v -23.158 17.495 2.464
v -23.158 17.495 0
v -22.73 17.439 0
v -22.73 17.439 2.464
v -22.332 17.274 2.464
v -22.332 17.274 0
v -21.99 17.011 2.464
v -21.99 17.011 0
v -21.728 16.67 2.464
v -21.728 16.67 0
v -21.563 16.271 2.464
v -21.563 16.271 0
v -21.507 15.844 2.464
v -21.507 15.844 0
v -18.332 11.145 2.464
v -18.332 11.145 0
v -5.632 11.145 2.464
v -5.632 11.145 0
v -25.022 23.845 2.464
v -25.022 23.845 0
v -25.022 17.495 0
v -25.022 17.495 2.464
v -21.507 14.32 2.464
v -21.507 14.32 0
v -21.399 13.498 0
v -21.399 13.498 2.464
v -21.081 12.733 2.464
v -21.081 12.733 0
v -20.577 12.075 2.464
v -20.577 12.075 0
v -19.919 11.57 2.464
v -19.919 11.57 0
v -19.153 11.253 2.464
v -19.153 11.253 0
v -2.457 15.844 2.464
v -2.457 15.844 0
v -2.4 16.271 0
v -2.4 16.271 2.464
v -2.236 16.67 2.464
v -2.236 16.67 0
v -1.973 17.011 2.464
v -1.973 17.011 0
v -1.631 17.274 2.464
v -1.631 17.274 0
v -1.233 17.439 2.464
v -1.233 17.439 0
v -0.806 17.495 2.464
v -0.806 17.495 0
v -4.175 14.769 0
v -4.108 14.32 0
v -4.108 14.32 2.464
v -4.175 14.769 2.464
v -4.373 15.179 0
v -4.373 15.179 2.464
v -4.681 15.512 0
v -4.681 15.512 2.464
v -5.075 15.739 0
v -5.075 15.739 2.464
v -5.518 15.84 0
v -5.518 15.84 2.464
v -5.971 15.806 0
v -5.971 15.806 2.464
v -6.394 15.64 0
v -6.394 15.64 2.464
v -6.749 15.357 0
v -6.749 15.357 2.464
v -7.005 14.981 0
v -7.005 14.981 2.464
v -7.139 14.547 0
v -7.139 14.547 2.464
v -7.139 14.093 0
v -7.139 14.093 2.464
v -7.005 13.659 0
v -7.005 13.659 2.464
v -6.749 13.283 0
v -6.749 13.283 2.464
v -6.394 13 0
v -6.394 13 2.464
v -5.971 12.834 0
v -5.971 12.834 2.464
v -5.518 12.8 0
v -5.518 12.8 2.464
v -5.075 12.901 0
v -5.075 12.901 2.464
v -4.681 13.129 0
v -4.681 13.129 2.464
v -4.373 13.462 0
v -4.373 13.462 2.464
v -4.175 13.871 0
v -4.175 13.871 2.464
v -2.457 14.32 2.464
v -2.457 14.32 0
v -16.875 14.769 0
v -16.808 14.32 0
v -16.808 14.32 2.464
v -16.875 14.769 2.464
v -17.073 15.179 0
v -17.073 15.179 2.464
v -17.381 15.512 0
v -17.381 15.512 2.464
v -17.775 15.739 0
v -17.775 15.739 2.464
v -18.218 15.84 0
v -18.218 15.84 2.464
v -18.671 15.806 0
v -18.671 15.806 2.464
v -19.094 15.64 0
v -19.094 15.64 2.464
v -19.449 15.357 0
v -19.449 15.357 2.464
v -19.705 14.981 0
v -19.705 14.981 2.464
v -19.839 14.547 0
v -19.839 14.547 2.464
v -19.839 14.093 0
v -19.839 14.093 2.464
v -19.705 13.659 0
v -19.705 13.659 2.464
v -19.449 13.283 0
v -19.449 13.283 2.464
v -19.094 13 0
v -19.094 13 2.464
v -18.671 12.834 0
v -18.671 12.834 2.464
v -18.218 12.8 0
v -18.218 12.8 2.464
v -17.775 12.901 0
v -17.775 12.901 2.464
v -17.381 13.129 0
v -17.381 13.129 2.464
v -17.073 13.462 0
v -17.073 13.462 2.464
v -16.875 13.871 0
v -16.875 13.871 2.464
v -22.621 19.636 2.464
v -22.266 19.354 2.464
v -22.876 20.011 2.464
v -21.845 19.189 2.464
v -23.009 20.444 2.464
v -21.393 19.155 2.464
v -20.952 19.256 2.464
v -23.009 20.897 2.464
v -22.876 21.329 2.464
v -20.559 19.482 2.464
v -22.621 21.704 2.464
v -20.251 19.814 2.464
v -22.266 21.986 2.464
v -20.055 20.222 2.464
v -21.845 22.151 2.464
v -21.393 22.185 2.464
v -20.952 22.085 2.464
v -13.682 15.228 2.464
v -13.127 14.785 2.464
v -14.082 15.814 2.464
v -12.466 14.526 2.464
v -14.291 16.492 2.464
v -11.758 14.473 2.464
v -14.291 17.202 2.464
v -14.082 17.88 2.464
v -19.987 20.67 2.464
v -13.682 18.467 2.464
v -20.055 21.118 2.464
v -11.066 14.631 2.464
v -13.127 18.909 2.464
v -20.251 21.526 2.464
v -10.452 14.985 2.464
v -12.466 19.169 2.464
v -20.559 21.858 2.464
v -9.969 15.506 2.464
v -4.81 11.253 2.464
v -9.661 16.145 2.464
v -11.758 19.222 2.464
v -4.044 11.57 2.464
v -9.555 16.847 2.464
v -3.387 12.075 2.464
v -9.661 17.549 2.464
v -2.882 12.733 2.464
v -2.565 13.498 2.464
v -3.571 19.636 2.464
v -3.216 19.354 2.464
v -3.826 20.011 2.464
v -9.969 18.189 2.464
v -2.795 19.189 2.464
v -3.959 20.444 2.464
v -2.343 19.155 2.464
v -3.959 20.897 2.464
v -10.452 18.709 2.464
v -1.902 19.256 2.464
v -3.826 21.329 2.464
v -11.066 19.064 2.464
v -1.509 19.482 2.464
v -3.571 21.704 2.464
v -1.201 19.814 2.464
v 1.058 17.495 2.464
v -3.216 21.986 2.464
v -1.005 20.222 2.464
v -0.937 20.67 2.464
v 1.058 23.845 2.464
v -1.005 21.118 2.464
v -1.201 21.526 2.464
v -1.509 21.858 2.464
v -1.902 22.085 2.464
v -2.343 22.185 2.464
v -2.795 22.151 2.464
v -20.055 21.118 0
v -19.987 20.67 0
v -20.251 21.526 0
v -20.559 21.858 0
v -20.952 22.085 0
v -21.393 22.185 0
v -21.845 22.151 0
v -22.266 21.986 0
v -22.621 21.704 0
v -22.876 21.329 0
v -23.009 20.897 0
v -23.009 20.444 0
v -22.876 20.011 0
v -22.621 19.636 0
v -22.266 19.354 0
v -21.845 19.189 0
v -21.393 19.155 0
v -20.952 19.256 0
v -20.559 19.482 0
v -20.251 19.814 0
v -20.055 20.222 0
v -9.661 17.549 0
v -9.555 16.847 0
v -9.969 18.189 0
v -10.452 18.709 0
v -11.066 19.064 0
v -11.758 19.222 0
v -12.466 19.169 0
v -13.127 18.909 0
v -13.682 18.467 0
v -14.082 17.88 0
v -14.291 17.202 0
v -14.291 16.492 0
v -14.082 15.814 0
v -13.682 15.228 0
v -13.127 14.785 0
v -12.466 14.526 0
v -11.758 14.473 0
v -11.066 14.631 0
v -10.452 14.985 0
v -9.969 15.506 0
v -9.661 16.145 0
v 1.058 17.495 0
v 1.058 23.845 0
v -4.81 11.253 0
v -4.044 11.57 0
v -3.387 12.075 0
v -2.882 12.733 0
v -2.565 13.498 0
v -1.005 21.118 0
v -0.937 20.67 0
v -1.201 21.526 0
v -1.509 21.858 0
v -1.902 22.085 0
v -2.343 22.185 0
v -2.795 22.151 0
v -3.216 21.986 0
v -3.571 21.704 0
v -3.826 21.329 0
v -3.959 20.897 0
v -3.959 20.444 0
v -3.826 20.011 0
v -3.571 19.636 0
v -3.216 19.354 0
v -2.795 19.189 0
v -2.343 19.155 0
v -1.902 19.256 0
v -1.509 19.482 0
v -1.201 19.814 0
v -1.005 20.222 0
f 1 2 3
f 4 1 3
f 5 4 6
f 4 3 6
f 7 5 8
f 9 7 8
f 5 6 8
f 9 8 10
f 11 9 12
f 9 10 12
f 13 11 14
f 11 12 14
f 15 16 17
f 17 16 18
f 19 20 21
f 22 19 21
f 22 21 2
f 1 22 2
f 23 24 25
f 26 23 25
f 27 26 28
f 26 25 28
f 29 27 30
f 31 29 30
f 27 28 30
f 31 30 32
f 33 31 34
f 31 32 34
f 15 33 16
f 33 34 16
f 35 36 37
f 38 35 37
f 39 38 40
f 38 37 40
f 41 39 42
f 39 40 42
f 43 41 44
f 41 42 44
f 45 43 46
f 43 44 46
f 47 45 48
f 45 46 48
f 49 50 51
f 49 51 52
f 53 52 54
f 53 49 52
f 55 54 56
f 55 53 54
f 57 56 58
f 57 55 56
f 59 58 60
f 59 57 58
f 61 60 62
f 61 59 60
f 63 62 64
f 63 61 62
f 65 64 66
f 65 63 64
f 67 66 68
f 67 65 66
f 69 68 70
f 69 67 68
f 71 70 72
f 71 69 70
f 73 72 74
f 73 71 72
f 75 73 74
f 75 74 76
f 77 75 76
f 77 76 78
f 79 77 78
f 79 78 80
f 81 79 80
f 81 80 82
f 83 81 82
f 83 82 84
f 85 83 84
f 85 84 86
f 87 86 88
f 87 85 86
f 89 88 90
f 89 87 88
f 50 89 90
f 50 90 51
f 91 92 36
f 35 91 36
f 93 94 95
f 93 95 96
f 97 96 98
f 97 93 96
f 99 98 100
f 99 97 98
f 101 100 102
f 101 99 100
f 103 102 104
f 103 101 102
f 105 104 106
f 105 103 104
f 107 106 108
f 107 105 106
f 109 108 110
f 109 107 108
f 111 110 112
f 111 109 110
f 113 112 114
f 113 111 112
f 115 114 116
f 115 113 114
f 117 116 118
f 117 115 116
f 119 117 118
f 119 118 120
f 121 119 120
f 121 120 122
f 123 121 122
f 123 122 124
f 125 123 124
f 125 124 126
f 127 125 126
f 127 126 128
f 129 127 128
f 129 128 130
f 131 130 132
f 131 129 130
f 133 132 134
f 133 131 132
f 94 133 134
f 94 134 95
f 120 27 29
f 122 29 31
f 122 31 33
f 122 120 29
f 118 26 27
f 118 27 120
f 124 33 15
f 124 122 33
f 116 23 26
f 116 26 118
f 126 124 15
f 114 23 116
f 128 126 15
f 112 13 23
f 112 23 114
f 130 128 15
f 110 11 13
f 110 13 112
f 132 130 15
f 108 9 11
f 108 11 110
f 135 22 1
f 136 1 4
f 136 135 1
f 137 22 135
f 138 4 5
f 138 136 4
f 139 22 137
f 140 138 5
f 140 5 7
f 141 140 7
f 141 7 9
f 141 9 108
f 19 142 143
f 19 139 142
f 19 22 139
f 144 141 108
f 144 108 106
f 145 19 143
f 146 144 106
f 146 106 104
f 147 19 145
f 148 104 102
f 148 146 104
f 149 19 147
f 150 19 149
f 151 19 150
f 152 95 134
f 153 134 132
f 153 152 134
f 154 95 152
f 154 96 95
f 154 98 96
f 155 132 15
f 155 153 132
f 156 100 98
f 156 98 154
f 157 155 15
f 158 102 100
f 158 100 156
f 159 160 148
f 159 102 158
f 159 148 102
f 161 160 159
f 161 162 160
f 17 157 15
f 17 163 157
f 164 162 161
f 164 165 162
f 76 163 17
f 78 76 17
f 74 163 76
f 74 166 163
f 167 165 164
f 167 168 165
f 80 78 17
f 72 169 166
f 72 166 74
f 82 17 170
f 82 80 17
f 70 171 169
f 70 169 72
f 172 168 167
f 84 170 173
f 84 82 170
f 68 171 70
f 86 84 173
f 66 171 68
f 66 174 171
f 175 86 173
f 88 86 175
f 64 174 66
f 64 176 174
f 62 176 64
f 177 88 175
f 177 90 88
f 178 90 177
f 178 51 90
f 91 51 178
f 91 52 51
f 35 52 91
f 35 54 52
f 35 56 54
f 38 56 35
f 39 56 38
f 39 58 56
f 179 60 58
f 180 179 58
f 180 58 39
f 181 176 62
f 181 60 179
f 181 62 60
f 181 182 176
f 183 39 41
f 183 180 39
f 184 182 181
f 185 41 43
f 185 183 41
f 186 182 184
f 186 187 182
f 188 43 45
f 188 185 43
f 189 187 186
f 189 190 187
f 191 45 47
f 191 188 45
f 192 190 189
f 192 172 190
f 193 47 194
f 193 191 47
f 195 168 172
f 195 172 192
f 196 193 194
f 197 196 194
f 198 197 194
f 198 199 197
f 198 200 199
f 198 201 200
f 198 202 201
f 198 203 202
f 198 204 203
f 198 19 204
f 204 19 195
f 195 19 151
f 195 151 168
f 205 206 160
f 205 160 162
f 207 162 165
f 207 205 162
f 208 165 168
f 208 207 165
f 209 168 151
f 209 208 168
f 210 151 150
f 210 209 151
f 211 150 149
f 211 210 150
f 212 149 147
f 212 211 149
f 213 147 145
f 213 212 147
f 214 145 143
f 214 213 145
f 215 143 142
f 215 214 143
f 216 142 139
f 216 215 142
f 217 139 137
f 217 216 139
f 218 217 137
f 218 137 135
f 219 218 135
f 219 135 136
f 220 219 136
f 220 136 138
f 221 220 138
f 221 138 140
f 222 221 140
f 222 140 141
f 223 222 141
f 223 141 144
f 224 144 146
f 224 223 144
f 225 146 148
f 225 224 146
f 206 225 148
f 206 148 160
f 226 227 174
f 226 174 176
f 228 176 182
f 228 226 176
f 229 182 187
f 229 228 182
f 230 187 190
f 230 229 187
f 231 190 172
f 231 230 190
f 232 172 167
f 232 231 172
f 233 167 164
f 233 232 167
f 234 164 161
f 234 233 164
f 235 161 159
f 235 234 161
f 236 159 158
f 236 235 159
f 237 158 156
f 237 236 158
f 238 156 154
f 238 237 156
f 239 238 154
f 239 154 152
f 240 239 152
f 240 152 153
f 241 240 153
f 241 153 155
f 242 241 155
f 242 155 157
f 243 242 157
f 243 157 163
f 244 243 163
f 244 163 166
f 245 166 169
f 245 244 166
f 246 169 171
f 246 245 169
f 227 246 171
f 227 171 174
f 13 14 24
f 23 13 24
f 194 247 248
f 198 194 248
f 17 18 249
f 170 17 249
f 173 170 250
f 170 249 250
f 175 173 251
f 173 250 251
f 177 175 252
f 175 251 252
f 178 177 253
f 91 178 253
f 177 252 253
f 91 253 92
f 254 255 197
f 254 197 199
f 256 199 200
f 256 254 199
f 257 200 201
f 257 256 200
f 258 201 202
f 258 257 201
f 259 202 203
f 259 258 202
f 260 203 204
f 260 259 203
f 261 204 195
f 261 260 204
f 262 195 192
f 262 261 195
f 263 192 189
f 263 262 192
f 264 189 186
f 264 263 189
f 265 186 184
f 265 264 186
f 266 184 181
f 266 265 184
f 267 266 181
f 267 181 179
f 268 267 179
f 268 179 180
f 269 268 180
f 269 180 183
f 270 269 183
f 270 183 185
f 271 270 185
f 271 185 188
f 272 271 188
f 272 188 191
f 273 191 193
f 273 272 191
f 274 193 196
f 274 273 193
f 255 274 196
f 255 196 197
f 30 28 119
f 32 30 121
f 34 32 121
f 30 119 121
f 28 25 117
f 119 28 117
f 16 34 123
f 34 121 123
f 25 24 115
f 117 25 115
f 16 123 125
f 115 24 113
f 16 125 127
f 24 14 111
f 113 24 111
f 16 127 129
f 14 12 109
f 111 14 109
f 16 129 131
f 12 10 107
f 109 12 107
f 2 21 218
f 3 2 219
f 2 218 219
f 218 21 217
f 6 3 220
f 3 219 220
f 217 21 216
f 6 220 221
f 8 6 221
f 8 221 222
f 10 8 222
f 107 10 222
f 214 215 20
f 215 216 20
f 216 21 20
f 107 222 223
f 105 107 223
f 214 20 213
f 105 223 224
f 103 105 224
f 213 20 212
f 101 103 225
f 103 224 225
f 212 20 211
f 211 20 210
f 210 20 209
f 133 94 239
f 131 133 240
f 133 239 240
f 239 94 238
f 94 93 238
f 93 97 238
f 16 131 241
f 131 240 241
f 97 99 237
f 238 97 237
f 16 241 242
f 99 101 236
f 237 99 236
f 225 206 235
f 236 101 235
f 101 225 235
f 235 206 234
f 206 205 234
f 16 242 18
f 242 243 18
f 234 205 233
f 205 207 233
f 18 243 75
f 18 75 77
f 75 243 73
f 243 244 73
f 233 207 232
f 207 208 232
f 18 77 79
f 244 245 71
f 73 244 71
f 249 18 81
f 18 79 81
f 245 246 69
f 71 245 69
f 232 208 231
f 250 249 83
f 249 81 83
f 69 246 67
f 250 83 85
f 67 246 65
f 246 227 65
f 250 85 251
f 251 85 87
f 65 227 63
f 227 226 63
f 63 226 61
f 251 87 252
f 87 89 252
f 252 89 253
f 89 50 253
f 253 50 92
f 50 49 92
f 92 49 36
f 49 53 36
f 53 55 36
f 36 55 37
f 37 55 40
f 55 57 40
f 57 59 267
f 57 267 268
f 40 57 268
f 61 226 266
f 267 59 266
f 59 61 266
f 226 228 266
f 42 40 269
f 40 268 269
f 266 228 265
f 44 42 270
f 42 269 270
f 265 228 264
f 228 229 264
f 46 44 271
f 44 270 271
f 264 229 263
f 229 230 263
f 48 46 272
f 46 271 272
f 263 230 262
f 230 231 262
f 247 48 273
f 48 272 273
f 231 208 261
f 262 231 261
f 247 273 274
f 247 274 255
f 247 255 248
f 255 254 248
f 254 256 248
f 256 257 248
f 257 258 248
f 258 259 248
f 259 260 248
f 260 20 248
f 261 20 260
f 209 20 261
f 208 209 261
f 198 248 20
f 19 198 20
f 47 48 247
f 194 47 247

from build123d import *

# Parameters (mm, degrees)
F0_R     = 1.524
F0_R_2   = 2.38125
F0_R_3   = 1.519554
F1_DEPTH = 2.4638


with BuildPart() as f1:
    # F0 (on Top) → F1 (new body)
    with BuildSketch(Plane.XY):
        with BuildLine():
            ThreePointArc((-21.506696, 14.320038), (-20.57676, 12.074974), (-18.331696, 11.145038))
            Line((-18.331696, 11.145038), (-17.426178, 11.145038))
            Line((-17.426178, 11.145038), (-6.537213, 11.145038))
            Line((-6.537213, 11.145038), (-5.631696, 11.145038))
            ThreePointArc((-5.631696, 11.145038), (-3.386632, 12.074974), (-2.456696, 14.320038))
            Line((-2.456696, 14.320038), (-2.456696, 15.844038))
            ThreePointArc((-2.456696, 15.844038), (-1.973129, 17.011471), (-0.805696, 17.495038))
            Line((-0.805696, 17.495038), (-0.59268, 17.495038))
            Line((-0.59268, 17.495038), (1.05832, 17.495038))
            Line((1.05832, 17.495038), (1.05832, 19.146038))
            Line((1.05832, 19.146038), (1.05832, 22.194038))
            Line((1.05832, 22.194038), (1.05832, 23.845038))
            Line((1.05832, 23.845038), (-0.59268, 23.845038))
            Line((-0.59268, 23.845038), (-2.456696, 23.845038))
            Line((-2.456696, 23.845038), (-4.92218, 23.845038))
            Line((-4.92218, 23.845038), (-18.700644, 23.845038))
            Line((-18.700644, 23.845038), (-23.370711, 23.845038))
            Line((-23.370711, 23.845038), (-25.021711, 23.845038))
            Line((-25.021711, 23.845038), (-25.021711, 22.194038))
            Line((-25.021711, 22.194038), (-25.021711, 19.146038))
            Line((-25.021711, 19.146038), (-25.021711, 17.495038))
            Line((-25.021711, 17.495038), (-23.370711, 17.495038))
            Line((-23.370711, 17.495038), (-23.157696, 17.495038))
            ThreePointArc((-23.157696, 17.495038), (-21.990262, 17.011471), (-21.506696, 15.844038))
            Line((-21.506696, 15.844038), (-21.506696, 14.320038))
        make_face()
        with Locations((-18.331696, 14.320038)):
            Circle(F0_R, mode=Mode.SUBTRACT)
        with Locations((-5.631696, 14.320038)):
            Circle(F0_R, mode=Mode.SUBTRACT)
        with Locations((-11.936313, 16.847185)):
            Circle(F0_R_2, mode=Mode.SUBTRACT)
        with Locations((-21.506696, 20.670038)):
            Circle(F0_R_3, mode=Mode.SUBTRACT)
        with Locations((-2.456696, 20.670038)):
            Circle(F0_R_3, mode=Mode.SUBTRACT)
    extrude(amount=F1_DEPTH)


solid = f1.part
